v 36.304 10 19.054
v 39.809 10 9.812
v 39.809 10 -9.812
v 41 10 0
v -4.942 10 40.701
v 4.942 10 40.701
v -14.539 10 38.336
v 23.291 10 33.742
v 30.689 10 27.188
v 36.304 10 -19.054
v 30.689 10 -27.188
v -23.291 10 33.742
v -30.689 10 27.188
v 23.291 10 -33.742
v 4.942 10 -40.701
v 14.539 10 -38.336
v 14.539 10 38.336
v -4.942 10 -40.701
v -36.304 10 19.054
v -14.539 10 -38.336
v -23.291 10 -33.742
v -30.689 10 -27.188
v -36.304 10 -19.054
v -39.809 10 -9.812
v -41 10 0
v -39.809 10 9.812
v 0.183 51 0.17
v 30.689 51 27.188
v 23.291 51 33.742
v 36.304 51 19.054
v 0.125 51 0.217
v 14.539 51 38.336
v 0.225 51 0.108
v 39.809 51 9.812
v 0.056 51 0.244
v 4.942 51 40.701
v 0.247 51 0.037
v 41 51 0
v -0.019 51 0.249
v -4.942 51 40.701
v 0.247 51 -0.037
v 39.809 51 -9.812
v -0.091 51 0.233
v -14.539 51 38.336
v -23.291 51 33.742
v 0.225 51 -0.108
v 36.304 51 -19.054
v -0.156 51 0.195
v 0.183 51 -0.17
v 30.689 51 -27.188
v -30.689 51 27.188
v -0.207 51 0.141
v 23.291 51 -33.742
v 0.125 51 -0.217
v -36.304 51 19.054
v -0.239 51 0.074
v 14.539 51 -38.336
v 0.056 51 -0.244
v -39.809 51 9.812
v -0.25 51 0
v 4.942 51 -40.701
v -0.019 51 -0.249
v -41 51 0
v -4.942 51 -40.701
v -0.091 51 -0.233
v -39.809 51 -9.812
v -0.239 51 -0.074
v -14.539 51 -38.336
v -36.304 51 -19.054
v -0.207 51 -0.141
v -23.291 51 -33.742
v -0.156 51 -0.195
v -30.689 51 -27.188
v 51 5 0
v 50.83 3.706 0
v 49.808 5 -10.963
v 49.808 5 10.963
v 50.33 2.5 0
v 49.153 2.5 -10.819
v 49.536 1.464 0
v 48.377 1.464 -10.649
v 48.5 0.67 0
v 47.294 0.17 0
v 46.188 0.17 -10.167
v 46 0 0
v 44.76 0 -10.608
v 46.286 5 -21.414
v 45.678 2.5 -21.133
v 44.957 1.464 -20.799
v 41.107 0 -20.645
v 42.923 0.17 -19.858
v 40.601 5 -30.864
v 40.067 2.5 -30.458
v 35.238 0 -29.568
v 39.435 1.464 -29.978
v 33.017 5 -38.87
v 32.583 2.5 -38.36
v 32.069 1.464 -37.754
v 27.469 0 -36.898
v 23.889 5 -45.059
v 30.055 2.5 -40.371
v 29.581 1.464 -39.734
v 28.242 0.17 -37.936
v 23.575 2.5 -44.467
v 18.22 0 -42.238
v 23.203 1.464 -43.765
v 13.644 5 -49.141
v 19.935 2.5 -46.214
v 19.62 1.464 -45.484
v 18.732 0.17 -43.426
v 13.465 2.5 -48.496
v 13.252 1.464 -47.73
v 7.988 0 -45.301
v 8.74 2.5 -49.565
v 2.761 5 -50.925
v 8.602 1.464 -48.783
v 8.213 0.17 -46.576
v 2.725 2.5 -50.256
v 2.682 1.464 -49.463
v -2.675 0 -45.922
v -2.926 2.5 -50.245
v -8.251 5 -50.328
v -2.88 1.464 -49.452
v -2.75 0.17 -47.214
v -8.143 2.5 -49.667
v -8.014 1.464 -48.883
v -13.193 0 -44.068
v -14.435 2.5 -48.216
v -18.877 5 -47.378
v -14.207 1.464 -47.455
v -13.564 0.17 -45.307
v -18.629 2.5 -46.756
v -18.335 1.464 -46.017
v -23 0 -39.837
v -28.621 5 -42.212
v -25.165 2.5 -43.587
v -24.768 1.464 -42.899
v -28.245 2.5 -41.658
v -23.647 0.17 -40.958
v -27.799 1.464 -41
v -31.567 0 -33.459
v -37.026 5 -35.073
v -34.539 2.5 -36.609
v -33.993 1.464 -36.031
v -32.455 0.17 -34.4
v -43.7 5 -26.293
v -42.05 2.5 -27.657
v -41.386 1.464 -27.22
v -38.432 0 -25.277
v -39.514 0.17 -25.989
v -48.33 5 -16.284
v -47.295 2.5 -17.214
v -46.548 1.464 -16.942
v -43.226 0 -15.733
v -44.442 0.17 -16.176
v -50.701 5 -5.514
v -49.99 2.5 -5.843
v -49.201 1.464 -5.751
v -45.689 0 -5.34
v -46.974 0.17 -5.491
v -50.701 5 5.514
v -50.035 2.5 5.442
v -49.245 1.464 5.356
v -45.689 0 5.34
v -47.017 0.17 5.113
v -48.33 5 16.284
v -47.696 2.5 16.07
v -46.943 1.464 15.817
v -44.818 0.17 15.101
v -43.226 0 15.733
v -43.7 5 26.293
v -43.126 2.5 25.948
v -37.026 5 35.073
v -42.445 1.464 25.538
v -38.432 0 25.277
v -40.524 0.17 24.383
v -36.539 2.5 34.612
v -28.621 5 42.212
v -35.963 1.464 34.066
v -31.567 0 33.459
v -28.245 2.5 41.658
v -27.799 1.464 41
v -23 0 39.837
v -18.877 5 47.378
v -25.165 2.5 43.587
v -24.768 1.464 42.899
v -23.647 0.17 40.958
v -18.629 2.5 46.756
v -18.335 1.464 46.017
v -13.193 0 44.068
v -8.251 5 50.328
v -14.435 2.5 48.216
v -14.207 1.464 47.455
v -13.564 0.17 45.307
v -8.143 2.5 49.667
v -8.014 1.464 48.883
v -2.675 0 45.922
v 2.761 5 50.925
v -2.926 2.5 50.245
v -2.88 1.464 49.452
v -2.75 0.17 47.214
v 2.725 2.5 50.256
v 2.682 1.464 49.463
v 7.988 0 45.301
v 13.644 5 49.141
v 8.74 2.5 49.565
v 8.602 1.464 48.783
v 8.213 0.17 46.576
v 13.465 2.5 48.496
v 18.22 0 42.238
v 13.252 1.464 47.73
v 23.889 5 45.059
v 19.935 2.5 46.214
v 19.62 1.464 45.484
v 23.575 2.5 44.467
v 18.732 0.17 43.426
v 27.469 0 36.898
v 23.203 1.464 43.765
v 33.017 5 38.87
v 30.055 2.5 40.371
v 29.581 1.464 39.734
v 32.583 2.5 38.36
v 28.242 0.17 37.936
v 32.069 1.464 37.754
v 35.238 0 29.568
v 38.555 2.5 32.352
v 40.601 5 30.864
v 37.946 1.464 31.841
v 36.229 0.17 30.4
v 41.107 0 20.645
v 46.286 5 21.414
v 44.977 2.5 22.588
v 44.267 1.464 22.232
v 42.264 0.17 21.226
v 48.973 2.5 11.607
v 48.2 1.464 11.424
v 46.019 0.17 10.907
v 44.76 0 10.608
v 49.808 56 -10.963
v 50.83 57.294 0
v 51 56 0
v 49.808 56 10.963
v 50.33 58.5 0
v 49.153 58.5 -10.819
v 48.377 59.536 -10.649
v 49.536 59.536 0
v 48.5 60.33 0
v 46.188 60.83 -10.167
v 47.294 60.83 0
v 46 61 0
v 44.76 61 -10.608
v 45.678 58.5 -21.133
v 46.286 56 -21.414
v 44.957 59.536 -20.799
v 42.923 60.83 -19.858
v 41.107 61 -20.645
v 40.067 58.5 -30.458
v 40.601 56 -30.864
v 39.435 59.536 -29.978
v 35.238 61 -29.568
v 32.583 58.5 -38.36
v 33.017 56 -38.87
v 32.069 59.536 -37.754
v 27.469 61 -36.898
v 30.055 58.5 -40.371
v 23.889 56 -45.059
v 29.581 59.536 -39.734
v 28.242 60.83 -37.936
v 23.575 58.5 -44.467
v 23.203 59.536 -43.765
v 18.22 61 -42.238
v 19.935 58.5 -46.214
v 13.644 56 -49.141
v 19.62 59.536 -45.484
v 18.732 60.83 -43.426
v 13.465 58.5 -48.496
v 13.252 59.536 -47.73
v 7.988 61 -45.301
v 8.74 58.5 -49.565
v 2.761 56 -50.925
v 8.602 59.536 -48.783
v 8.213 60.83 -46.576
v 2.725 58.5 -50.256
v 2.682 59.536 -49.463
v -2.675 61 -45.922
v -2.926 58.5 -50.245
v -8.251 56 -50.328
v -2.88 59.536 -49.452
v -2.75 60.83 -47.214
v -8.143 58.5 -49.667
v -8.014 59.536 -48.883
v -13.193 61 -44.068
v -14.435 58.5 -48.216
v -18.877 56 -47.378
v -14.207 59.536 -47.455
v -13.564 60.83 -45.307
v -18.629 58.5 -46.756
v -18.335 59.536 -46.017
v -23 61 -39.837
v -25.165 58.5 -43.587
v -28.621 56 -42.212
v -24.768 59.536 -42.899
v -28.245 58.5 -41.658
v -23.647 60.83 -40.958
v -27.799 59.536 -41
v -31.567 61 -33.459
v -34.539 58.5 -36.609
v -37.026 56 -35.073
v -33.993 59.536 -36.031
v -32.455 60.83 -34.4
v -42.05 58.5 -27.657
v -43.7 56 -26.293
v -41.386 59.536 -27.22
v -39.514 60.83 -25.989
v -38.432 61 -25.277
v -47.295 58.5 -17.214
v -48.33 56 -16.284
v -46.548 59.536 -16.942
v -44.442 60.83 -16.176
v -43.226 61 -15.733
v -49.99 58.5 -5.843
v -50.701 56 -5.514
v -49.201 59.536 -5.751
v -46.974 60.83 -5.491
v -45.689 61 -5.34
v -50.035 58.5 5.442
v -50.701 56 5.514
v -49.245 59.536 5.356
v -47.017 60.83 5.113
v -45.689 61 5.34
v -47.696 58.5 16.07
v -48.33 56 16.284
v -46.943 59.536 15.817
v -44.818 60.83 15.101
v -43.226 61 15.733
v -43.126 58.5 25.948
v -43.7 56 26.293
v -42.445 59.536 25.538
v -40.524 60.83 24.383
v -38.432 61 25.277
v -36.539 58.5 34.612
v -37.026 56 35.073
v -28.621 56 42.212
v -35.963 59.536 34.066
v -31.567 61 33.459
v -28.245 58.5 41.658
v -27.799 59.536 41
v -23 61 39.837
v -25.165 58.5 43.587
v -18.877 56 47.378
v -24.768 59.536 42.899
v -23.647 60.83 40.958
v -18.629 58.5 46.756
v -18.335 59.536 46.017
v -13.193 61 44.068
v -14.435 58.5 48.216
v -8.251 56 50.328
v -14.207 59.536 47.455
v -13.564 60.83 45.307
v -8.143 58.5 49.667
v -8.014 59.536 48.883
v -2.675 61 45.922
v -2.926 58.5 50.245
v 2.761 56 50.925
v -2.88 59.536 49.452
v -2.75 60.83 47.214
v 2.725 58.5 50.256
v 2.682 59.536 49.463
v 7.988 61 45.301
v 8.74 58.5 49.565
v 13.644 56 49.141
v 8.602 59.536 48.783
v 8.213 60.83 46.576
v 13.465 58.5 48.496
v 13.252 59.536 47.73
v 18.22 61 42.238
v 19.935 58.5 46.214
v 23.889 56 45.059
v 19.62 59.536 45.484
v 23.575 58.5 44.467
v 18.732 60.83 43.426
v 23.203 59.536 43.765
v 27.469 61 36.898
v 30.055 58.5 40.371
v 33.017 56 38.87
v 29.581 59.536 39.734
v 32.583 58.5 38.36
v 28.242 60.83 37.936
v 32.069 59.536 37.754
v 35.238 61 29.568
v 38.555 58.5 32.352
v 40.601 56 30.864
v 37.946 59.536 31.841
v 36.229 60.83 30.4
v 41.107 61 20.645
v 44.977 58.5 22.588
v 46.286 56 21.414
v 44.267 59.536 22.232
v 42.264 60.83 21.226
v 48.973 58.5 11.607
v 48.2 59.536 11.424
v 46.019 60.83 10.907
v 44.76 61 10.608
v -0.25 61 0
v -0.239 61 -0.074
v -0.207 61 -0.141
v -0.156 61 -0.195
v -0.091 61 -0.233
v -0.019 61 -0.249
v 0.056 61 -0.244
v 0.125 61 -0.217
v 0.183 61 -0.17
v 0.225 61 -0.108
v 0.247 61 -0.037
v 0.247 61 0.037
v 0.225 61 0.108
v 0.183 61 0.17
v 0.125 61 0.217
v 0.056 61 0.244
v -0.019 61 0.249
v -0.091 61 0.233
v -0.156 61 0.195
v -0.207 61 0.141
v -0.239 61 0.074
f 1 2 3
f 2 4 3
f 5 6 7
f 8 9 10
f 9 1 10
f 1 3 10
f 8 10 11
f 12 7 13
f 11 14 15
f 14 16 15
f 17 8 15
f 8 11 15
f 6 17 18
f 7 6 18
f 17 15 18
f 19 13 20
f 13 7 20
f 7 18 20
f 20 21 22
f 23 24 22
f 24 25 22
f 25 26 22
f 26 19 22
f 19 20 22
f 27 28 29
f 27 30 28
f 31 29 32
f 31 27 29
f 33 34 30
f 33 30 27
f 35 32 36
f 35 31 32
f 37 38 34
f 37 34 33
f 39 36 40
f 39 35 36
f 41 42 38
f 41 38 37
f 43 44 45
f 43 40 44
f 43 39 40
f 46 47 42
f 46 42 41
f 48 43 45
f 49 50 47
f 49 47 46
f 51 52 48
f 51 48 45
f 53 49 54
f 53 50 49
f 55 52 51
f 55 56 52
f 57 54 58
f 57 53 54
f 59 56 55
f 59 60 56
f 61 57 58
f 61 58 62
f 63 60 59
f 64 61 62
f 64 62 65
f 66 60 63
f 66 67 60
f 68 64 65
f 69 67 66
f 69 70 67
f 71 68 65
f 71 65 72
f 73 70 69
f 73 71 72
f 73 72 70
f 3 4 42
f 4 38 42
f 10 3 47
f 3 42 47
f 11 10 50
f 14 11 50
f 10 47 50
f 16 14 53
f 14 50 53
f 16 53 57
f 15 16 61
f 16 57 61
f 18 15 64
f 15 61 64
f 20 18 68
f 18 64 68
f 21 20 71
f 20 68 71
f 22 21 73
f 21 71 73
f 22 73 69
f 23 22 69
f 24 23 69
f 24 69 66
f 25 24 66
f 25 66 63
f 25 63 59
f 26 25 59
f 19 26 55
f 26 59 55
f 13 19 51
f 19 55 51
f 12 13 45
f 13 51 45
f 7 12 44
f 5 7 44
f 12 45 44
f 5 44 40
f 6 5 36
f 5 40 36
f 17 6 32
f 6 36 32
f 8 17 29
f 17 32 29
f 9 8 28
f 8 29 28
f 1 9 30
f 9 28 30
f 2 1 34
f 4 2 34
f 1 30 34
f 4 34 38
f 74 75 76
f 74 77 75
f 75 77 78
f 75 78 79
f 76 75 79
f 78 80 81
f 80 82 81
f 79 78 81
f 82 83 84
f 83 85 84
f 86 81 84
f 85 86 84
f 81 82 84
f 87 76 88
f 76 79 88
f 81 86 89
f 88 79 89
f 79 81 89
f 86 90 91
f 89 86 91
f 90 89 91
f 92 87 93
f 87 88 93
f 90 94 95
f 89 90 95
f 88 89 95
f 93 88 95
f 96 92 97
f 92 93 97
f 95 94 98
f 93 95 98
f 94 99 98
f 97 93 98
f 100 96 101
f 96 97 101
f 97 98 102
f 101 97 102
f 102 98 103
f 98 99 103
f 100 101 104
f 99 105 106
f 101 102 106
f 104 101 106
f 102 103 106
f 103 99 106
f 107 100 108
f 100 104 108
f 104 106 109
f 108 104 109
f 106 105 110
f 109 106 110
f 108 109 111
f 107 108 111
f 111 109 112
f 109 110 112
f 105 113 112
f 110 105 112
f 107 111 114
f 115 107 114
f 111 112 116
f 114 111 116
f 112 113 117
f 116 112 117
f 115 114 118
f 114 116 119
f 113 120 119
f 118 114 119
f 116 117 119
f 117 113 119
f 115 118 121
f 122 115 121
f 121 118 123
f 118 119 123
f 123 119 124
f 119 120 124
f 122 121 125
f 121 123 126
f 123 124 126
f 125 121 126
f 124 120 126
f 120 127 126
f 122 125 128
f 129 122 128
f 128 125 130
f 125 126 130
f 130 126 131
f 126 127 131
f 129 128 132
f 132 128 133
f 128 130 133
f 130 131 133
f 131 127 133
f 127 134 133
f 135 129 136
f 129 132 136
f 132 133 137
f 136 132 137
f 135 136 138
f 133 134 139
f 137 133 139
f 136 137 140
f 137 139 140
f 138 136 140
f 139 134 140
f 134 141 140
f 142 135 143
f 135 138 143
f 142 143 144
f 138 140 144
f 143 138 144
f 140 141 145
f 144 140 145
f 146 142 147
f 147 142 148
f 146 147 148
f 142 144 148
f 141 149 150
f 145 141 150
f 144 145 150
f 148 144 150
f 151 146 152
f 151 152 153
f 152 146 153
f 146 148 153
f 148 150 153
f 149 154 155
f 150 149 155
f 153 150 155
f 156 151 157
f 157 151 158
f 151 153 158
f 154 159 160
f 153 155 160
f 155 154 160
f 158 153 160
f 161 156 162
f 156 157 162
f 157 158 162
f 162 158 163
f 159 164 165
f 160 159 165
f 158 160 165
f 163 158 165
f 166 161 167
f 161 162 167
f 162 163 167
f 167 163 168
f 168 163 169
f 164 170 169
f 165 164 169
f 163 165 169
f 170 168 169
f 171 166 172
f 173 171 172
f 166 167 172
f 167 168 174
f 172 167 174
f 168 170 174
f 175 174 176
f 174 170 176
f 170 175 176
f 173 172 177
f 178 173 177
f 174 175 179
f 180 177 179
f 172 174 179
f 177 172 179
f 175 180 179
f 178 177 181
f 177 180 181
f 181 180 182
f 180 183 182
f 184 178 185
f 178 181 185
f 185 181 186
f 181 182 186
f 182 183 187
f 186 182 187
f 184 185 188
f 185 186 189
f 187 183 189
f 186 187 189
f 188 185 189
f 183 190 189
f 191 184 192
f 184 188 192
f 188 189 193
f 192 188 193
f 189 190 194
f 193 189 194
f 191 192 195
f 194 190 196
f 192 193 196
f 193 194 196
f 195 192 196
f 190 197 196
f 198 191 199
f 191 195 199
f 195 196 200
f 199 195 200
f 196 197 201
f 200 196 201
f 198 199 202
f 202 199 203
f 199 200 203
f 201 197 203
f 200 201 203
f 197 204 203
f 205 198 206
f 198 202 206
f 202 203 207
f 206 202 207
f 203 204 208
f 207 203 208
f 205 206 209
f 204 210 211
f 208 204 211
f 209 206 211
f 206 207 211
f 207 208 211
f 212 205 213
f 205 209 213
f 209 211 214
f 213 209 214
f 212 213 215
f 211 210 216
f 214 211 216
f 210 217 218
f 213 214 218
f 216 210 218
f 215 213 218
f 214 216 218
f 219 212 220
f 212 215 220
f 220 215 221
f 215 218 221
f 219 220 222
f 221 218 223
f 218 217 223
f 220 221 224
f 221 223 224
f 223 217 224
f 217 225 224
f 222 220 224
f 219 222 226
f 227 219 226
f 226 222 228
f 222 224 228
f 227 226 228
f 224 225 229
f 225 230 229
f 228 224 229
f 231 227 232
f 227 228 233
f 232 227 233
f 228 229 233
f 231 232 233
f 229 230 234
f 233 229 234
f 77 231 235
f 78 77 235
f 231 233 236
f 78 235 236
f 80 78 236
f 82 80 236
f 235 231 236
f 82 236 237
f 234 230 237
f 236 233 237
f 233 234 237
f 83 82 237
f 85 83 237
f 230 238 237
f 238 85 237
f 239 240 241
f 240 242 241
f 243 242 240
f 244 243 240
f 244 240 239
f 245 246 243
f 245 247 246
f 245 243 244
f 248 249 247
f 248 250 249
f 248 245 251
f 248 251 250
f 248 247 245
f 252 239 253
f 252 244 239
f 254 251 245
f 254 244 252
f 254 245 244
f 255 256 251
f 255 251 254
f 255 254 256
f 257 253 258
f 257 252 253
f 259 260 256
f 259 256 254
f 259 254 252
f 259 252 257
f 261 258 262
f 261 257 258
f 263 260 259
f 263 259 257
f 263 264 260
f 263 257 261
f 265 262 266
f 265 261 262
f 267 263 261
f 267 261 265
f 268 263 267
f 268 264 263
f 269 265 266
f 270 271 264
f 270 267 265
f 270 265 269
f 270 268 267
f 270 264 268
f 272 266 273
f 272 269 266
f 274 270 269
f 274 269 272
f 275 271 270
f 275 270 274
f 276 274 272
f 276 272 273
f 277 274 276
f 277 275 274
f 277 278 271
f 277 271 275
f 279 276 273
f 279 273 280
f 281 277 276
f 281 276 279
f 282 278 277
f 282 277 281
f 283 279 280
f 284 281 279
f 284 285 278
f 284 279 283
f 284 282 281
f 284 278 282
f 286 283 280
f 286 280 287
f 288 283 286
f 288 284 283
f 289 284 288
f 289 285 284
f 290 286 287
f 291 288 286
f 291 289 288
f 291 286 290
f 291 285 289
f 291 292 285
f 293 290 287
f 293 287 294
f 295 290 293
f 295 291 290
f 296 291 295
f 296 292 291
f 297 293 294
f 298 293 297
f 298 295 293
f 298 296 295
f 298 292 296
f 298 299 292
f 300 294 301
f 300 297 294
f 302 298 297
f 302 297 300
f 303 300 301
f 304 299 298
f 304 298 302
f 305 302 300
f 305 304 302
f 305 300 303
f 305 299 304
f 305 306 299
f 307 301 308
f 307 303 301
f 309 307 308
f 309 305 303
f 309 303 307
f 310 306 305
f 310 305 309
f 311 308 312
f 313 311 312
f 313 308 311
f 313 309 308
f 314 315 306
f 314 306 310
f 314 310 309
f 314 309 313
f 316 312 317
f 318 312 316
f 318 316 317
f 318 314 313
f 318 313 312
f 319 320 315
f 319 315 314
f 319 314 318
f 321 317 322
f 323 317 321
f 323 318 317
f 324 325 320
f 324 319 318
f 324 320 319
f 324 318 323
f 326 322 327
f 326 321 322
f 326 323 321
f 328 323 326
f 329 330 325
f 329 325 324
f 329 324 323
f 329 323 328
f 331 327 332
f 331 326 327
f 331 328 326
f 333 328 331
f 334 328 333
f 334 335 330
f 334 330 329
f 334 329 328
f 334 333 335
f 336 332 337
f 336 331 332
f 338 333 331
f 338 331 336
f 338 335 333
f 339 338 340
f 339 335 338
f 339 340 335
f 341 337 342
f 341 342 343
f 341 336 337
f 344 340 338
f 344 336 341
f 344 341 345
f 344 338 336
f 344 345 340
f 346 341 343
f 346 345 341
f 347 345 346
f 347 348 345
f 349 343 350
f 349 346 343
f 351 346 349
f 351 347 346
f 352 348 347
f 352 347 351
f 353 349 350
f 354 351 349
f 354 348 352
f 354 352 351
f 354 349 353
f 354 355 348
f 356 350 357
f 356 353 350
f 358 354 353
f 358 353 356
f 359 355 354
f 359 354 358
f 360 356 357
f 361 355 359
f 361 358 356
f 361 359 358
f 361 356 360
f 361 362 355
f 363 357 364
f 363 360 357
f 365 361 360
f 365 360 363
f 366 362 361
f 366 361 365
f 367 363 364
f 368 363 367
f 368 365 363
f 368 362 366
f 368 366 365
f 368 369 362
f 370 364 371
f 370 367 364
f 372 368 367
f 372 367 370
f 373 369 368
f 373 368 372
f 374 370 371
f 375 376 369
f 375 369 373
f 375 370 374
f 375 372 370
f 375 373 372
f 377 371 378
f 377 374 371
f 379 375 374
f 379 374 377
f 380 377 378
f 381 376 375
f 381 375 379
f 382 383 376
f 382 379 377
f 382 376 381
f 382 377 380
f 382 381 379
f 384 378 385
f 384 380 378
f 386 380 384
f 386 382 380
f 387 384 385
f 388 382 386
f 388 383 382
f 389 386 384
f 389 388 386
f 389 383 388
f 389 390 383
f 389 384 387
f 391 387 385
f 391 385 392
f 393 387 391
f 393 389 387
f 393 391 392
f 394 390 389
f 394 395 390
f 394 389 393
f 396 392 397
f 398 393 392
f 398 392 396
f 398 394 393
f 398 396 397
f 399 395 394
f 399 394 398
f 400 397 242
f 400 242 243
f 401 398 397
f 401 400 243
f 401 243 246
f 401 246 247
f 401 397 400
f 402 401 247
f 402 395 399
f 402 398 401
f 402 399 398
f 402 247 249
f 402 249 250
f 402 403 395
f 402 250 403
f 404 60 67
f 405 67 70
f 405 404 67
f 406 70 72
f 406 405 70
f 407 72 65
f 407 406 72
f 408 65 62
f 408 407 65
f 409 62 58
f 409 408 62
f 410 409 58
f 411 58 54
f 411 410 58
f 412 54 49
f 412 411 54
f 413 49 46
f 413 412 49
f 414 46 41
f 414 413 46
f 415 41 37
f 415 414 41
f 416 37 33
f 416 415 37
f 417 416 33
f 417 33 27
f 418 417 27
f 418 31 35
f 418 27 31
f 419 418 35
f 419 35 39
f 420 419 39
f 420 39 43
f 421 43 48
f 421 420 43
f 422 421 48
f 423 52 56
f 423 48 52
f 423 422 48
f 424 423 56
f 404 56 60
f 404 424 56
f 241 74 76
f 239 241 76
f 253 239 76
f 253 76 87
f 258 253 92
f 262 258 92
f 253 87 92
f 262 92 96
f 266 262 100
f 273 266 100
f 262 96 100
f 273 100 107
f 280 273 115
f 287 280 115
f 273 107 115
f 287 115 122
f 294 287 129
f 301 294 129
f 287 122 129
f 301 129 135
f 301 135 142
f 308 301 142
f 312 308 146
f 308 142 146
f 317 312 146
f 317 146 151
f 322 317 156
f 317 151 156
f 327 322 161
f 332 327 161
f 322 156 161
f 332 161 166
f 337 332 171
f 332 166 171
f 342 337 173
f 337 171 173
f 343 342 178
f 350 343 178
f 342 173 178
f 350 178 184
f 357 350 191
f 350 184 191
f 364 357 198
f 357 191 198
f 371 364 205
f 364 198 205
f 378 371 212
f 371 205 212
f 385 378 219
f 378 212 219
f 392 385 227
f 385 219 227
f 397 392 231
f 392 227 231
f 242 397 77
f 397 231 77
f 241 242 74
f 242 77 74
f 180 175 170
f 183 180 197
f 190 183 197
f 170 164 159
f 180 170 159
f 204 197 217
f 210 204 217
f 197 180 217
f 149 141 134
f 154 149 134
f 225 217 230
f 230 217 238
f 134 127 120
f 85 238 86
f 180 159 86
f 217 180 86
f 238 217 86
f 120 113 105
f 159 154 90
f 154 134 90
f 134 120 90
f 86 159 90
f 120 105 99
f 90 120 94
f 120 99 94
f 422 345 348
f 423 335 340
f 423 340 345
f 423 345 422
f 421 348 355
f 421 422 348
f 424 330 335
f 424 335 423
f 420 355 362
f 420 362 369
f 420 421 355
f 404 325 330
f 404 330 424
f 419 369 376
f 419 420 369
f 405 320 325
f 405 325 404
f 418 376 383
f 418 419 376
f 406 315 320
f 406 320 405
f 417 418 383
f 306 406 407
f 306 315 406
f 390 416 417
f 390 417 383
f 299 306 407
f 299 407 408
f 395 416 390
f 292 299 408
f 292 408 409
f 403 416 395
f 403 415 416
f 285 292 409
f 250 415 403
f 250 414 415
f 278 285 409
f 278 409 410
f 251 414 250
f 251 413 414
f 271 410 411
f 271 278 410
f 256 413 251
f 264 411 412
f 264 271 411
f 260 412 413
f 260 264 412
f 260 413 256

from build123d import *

# Parameters (mm, degrees)
SKETCH_1_R      = 51
EXTRUDE_1_DEPTH = 61
FILLET_1_R      = 5
SKETCH_6_W      = 41
SKETCH_6_H      = 41
SKETCH_7_W      = 0.25
SKETCH_7_H      = 45.977886119


with BuildPart() as part:
    # 草图1 → 凸台-拉伸1 (new body)
    with BuildSketch(Plane(origin=(0, 0, 0), x_dir=(1, 0, 0), z_dir=(0, 1, 0))):
        Circle(SKETCH_1_R)
    extrude(amount=EXTRUDE_1_DEPTH)

    # 圆角1
    fillet_1_edges = [part.edges().sort_by_distance(p)[0] for p in [
        (-51, 0, 0),
        (-51, 61, 0),
    ]]
    fillet(fillet_1_edges, radius=FILLET_1_R)

    # 草图6 → 切除-旋转4 (revolve, cut)
    with BuildSketch(Plane.XY):
        with Locations((20.5, 30.5)):
            Rectangle(SKETCH_6_W, SKETCH_6_H)
    revolve(axis=Axis((0, 0, 0), (0, 1, 0)), mode=Mode.SUBTRACT)

    # 草图7 → 切除-旋转5 (revolve, cut)
    with BuildSketch(Plane.XY):
        with Locations((-0.125, 38.011056941)):
            Rectangle(SKETCH_7_W, SKETCH_7_H)
    revolve(axis=Axis((0, 61, 0), (0, -1, 0)), mode=Mode.SUBTRACT)


solid = part.part
